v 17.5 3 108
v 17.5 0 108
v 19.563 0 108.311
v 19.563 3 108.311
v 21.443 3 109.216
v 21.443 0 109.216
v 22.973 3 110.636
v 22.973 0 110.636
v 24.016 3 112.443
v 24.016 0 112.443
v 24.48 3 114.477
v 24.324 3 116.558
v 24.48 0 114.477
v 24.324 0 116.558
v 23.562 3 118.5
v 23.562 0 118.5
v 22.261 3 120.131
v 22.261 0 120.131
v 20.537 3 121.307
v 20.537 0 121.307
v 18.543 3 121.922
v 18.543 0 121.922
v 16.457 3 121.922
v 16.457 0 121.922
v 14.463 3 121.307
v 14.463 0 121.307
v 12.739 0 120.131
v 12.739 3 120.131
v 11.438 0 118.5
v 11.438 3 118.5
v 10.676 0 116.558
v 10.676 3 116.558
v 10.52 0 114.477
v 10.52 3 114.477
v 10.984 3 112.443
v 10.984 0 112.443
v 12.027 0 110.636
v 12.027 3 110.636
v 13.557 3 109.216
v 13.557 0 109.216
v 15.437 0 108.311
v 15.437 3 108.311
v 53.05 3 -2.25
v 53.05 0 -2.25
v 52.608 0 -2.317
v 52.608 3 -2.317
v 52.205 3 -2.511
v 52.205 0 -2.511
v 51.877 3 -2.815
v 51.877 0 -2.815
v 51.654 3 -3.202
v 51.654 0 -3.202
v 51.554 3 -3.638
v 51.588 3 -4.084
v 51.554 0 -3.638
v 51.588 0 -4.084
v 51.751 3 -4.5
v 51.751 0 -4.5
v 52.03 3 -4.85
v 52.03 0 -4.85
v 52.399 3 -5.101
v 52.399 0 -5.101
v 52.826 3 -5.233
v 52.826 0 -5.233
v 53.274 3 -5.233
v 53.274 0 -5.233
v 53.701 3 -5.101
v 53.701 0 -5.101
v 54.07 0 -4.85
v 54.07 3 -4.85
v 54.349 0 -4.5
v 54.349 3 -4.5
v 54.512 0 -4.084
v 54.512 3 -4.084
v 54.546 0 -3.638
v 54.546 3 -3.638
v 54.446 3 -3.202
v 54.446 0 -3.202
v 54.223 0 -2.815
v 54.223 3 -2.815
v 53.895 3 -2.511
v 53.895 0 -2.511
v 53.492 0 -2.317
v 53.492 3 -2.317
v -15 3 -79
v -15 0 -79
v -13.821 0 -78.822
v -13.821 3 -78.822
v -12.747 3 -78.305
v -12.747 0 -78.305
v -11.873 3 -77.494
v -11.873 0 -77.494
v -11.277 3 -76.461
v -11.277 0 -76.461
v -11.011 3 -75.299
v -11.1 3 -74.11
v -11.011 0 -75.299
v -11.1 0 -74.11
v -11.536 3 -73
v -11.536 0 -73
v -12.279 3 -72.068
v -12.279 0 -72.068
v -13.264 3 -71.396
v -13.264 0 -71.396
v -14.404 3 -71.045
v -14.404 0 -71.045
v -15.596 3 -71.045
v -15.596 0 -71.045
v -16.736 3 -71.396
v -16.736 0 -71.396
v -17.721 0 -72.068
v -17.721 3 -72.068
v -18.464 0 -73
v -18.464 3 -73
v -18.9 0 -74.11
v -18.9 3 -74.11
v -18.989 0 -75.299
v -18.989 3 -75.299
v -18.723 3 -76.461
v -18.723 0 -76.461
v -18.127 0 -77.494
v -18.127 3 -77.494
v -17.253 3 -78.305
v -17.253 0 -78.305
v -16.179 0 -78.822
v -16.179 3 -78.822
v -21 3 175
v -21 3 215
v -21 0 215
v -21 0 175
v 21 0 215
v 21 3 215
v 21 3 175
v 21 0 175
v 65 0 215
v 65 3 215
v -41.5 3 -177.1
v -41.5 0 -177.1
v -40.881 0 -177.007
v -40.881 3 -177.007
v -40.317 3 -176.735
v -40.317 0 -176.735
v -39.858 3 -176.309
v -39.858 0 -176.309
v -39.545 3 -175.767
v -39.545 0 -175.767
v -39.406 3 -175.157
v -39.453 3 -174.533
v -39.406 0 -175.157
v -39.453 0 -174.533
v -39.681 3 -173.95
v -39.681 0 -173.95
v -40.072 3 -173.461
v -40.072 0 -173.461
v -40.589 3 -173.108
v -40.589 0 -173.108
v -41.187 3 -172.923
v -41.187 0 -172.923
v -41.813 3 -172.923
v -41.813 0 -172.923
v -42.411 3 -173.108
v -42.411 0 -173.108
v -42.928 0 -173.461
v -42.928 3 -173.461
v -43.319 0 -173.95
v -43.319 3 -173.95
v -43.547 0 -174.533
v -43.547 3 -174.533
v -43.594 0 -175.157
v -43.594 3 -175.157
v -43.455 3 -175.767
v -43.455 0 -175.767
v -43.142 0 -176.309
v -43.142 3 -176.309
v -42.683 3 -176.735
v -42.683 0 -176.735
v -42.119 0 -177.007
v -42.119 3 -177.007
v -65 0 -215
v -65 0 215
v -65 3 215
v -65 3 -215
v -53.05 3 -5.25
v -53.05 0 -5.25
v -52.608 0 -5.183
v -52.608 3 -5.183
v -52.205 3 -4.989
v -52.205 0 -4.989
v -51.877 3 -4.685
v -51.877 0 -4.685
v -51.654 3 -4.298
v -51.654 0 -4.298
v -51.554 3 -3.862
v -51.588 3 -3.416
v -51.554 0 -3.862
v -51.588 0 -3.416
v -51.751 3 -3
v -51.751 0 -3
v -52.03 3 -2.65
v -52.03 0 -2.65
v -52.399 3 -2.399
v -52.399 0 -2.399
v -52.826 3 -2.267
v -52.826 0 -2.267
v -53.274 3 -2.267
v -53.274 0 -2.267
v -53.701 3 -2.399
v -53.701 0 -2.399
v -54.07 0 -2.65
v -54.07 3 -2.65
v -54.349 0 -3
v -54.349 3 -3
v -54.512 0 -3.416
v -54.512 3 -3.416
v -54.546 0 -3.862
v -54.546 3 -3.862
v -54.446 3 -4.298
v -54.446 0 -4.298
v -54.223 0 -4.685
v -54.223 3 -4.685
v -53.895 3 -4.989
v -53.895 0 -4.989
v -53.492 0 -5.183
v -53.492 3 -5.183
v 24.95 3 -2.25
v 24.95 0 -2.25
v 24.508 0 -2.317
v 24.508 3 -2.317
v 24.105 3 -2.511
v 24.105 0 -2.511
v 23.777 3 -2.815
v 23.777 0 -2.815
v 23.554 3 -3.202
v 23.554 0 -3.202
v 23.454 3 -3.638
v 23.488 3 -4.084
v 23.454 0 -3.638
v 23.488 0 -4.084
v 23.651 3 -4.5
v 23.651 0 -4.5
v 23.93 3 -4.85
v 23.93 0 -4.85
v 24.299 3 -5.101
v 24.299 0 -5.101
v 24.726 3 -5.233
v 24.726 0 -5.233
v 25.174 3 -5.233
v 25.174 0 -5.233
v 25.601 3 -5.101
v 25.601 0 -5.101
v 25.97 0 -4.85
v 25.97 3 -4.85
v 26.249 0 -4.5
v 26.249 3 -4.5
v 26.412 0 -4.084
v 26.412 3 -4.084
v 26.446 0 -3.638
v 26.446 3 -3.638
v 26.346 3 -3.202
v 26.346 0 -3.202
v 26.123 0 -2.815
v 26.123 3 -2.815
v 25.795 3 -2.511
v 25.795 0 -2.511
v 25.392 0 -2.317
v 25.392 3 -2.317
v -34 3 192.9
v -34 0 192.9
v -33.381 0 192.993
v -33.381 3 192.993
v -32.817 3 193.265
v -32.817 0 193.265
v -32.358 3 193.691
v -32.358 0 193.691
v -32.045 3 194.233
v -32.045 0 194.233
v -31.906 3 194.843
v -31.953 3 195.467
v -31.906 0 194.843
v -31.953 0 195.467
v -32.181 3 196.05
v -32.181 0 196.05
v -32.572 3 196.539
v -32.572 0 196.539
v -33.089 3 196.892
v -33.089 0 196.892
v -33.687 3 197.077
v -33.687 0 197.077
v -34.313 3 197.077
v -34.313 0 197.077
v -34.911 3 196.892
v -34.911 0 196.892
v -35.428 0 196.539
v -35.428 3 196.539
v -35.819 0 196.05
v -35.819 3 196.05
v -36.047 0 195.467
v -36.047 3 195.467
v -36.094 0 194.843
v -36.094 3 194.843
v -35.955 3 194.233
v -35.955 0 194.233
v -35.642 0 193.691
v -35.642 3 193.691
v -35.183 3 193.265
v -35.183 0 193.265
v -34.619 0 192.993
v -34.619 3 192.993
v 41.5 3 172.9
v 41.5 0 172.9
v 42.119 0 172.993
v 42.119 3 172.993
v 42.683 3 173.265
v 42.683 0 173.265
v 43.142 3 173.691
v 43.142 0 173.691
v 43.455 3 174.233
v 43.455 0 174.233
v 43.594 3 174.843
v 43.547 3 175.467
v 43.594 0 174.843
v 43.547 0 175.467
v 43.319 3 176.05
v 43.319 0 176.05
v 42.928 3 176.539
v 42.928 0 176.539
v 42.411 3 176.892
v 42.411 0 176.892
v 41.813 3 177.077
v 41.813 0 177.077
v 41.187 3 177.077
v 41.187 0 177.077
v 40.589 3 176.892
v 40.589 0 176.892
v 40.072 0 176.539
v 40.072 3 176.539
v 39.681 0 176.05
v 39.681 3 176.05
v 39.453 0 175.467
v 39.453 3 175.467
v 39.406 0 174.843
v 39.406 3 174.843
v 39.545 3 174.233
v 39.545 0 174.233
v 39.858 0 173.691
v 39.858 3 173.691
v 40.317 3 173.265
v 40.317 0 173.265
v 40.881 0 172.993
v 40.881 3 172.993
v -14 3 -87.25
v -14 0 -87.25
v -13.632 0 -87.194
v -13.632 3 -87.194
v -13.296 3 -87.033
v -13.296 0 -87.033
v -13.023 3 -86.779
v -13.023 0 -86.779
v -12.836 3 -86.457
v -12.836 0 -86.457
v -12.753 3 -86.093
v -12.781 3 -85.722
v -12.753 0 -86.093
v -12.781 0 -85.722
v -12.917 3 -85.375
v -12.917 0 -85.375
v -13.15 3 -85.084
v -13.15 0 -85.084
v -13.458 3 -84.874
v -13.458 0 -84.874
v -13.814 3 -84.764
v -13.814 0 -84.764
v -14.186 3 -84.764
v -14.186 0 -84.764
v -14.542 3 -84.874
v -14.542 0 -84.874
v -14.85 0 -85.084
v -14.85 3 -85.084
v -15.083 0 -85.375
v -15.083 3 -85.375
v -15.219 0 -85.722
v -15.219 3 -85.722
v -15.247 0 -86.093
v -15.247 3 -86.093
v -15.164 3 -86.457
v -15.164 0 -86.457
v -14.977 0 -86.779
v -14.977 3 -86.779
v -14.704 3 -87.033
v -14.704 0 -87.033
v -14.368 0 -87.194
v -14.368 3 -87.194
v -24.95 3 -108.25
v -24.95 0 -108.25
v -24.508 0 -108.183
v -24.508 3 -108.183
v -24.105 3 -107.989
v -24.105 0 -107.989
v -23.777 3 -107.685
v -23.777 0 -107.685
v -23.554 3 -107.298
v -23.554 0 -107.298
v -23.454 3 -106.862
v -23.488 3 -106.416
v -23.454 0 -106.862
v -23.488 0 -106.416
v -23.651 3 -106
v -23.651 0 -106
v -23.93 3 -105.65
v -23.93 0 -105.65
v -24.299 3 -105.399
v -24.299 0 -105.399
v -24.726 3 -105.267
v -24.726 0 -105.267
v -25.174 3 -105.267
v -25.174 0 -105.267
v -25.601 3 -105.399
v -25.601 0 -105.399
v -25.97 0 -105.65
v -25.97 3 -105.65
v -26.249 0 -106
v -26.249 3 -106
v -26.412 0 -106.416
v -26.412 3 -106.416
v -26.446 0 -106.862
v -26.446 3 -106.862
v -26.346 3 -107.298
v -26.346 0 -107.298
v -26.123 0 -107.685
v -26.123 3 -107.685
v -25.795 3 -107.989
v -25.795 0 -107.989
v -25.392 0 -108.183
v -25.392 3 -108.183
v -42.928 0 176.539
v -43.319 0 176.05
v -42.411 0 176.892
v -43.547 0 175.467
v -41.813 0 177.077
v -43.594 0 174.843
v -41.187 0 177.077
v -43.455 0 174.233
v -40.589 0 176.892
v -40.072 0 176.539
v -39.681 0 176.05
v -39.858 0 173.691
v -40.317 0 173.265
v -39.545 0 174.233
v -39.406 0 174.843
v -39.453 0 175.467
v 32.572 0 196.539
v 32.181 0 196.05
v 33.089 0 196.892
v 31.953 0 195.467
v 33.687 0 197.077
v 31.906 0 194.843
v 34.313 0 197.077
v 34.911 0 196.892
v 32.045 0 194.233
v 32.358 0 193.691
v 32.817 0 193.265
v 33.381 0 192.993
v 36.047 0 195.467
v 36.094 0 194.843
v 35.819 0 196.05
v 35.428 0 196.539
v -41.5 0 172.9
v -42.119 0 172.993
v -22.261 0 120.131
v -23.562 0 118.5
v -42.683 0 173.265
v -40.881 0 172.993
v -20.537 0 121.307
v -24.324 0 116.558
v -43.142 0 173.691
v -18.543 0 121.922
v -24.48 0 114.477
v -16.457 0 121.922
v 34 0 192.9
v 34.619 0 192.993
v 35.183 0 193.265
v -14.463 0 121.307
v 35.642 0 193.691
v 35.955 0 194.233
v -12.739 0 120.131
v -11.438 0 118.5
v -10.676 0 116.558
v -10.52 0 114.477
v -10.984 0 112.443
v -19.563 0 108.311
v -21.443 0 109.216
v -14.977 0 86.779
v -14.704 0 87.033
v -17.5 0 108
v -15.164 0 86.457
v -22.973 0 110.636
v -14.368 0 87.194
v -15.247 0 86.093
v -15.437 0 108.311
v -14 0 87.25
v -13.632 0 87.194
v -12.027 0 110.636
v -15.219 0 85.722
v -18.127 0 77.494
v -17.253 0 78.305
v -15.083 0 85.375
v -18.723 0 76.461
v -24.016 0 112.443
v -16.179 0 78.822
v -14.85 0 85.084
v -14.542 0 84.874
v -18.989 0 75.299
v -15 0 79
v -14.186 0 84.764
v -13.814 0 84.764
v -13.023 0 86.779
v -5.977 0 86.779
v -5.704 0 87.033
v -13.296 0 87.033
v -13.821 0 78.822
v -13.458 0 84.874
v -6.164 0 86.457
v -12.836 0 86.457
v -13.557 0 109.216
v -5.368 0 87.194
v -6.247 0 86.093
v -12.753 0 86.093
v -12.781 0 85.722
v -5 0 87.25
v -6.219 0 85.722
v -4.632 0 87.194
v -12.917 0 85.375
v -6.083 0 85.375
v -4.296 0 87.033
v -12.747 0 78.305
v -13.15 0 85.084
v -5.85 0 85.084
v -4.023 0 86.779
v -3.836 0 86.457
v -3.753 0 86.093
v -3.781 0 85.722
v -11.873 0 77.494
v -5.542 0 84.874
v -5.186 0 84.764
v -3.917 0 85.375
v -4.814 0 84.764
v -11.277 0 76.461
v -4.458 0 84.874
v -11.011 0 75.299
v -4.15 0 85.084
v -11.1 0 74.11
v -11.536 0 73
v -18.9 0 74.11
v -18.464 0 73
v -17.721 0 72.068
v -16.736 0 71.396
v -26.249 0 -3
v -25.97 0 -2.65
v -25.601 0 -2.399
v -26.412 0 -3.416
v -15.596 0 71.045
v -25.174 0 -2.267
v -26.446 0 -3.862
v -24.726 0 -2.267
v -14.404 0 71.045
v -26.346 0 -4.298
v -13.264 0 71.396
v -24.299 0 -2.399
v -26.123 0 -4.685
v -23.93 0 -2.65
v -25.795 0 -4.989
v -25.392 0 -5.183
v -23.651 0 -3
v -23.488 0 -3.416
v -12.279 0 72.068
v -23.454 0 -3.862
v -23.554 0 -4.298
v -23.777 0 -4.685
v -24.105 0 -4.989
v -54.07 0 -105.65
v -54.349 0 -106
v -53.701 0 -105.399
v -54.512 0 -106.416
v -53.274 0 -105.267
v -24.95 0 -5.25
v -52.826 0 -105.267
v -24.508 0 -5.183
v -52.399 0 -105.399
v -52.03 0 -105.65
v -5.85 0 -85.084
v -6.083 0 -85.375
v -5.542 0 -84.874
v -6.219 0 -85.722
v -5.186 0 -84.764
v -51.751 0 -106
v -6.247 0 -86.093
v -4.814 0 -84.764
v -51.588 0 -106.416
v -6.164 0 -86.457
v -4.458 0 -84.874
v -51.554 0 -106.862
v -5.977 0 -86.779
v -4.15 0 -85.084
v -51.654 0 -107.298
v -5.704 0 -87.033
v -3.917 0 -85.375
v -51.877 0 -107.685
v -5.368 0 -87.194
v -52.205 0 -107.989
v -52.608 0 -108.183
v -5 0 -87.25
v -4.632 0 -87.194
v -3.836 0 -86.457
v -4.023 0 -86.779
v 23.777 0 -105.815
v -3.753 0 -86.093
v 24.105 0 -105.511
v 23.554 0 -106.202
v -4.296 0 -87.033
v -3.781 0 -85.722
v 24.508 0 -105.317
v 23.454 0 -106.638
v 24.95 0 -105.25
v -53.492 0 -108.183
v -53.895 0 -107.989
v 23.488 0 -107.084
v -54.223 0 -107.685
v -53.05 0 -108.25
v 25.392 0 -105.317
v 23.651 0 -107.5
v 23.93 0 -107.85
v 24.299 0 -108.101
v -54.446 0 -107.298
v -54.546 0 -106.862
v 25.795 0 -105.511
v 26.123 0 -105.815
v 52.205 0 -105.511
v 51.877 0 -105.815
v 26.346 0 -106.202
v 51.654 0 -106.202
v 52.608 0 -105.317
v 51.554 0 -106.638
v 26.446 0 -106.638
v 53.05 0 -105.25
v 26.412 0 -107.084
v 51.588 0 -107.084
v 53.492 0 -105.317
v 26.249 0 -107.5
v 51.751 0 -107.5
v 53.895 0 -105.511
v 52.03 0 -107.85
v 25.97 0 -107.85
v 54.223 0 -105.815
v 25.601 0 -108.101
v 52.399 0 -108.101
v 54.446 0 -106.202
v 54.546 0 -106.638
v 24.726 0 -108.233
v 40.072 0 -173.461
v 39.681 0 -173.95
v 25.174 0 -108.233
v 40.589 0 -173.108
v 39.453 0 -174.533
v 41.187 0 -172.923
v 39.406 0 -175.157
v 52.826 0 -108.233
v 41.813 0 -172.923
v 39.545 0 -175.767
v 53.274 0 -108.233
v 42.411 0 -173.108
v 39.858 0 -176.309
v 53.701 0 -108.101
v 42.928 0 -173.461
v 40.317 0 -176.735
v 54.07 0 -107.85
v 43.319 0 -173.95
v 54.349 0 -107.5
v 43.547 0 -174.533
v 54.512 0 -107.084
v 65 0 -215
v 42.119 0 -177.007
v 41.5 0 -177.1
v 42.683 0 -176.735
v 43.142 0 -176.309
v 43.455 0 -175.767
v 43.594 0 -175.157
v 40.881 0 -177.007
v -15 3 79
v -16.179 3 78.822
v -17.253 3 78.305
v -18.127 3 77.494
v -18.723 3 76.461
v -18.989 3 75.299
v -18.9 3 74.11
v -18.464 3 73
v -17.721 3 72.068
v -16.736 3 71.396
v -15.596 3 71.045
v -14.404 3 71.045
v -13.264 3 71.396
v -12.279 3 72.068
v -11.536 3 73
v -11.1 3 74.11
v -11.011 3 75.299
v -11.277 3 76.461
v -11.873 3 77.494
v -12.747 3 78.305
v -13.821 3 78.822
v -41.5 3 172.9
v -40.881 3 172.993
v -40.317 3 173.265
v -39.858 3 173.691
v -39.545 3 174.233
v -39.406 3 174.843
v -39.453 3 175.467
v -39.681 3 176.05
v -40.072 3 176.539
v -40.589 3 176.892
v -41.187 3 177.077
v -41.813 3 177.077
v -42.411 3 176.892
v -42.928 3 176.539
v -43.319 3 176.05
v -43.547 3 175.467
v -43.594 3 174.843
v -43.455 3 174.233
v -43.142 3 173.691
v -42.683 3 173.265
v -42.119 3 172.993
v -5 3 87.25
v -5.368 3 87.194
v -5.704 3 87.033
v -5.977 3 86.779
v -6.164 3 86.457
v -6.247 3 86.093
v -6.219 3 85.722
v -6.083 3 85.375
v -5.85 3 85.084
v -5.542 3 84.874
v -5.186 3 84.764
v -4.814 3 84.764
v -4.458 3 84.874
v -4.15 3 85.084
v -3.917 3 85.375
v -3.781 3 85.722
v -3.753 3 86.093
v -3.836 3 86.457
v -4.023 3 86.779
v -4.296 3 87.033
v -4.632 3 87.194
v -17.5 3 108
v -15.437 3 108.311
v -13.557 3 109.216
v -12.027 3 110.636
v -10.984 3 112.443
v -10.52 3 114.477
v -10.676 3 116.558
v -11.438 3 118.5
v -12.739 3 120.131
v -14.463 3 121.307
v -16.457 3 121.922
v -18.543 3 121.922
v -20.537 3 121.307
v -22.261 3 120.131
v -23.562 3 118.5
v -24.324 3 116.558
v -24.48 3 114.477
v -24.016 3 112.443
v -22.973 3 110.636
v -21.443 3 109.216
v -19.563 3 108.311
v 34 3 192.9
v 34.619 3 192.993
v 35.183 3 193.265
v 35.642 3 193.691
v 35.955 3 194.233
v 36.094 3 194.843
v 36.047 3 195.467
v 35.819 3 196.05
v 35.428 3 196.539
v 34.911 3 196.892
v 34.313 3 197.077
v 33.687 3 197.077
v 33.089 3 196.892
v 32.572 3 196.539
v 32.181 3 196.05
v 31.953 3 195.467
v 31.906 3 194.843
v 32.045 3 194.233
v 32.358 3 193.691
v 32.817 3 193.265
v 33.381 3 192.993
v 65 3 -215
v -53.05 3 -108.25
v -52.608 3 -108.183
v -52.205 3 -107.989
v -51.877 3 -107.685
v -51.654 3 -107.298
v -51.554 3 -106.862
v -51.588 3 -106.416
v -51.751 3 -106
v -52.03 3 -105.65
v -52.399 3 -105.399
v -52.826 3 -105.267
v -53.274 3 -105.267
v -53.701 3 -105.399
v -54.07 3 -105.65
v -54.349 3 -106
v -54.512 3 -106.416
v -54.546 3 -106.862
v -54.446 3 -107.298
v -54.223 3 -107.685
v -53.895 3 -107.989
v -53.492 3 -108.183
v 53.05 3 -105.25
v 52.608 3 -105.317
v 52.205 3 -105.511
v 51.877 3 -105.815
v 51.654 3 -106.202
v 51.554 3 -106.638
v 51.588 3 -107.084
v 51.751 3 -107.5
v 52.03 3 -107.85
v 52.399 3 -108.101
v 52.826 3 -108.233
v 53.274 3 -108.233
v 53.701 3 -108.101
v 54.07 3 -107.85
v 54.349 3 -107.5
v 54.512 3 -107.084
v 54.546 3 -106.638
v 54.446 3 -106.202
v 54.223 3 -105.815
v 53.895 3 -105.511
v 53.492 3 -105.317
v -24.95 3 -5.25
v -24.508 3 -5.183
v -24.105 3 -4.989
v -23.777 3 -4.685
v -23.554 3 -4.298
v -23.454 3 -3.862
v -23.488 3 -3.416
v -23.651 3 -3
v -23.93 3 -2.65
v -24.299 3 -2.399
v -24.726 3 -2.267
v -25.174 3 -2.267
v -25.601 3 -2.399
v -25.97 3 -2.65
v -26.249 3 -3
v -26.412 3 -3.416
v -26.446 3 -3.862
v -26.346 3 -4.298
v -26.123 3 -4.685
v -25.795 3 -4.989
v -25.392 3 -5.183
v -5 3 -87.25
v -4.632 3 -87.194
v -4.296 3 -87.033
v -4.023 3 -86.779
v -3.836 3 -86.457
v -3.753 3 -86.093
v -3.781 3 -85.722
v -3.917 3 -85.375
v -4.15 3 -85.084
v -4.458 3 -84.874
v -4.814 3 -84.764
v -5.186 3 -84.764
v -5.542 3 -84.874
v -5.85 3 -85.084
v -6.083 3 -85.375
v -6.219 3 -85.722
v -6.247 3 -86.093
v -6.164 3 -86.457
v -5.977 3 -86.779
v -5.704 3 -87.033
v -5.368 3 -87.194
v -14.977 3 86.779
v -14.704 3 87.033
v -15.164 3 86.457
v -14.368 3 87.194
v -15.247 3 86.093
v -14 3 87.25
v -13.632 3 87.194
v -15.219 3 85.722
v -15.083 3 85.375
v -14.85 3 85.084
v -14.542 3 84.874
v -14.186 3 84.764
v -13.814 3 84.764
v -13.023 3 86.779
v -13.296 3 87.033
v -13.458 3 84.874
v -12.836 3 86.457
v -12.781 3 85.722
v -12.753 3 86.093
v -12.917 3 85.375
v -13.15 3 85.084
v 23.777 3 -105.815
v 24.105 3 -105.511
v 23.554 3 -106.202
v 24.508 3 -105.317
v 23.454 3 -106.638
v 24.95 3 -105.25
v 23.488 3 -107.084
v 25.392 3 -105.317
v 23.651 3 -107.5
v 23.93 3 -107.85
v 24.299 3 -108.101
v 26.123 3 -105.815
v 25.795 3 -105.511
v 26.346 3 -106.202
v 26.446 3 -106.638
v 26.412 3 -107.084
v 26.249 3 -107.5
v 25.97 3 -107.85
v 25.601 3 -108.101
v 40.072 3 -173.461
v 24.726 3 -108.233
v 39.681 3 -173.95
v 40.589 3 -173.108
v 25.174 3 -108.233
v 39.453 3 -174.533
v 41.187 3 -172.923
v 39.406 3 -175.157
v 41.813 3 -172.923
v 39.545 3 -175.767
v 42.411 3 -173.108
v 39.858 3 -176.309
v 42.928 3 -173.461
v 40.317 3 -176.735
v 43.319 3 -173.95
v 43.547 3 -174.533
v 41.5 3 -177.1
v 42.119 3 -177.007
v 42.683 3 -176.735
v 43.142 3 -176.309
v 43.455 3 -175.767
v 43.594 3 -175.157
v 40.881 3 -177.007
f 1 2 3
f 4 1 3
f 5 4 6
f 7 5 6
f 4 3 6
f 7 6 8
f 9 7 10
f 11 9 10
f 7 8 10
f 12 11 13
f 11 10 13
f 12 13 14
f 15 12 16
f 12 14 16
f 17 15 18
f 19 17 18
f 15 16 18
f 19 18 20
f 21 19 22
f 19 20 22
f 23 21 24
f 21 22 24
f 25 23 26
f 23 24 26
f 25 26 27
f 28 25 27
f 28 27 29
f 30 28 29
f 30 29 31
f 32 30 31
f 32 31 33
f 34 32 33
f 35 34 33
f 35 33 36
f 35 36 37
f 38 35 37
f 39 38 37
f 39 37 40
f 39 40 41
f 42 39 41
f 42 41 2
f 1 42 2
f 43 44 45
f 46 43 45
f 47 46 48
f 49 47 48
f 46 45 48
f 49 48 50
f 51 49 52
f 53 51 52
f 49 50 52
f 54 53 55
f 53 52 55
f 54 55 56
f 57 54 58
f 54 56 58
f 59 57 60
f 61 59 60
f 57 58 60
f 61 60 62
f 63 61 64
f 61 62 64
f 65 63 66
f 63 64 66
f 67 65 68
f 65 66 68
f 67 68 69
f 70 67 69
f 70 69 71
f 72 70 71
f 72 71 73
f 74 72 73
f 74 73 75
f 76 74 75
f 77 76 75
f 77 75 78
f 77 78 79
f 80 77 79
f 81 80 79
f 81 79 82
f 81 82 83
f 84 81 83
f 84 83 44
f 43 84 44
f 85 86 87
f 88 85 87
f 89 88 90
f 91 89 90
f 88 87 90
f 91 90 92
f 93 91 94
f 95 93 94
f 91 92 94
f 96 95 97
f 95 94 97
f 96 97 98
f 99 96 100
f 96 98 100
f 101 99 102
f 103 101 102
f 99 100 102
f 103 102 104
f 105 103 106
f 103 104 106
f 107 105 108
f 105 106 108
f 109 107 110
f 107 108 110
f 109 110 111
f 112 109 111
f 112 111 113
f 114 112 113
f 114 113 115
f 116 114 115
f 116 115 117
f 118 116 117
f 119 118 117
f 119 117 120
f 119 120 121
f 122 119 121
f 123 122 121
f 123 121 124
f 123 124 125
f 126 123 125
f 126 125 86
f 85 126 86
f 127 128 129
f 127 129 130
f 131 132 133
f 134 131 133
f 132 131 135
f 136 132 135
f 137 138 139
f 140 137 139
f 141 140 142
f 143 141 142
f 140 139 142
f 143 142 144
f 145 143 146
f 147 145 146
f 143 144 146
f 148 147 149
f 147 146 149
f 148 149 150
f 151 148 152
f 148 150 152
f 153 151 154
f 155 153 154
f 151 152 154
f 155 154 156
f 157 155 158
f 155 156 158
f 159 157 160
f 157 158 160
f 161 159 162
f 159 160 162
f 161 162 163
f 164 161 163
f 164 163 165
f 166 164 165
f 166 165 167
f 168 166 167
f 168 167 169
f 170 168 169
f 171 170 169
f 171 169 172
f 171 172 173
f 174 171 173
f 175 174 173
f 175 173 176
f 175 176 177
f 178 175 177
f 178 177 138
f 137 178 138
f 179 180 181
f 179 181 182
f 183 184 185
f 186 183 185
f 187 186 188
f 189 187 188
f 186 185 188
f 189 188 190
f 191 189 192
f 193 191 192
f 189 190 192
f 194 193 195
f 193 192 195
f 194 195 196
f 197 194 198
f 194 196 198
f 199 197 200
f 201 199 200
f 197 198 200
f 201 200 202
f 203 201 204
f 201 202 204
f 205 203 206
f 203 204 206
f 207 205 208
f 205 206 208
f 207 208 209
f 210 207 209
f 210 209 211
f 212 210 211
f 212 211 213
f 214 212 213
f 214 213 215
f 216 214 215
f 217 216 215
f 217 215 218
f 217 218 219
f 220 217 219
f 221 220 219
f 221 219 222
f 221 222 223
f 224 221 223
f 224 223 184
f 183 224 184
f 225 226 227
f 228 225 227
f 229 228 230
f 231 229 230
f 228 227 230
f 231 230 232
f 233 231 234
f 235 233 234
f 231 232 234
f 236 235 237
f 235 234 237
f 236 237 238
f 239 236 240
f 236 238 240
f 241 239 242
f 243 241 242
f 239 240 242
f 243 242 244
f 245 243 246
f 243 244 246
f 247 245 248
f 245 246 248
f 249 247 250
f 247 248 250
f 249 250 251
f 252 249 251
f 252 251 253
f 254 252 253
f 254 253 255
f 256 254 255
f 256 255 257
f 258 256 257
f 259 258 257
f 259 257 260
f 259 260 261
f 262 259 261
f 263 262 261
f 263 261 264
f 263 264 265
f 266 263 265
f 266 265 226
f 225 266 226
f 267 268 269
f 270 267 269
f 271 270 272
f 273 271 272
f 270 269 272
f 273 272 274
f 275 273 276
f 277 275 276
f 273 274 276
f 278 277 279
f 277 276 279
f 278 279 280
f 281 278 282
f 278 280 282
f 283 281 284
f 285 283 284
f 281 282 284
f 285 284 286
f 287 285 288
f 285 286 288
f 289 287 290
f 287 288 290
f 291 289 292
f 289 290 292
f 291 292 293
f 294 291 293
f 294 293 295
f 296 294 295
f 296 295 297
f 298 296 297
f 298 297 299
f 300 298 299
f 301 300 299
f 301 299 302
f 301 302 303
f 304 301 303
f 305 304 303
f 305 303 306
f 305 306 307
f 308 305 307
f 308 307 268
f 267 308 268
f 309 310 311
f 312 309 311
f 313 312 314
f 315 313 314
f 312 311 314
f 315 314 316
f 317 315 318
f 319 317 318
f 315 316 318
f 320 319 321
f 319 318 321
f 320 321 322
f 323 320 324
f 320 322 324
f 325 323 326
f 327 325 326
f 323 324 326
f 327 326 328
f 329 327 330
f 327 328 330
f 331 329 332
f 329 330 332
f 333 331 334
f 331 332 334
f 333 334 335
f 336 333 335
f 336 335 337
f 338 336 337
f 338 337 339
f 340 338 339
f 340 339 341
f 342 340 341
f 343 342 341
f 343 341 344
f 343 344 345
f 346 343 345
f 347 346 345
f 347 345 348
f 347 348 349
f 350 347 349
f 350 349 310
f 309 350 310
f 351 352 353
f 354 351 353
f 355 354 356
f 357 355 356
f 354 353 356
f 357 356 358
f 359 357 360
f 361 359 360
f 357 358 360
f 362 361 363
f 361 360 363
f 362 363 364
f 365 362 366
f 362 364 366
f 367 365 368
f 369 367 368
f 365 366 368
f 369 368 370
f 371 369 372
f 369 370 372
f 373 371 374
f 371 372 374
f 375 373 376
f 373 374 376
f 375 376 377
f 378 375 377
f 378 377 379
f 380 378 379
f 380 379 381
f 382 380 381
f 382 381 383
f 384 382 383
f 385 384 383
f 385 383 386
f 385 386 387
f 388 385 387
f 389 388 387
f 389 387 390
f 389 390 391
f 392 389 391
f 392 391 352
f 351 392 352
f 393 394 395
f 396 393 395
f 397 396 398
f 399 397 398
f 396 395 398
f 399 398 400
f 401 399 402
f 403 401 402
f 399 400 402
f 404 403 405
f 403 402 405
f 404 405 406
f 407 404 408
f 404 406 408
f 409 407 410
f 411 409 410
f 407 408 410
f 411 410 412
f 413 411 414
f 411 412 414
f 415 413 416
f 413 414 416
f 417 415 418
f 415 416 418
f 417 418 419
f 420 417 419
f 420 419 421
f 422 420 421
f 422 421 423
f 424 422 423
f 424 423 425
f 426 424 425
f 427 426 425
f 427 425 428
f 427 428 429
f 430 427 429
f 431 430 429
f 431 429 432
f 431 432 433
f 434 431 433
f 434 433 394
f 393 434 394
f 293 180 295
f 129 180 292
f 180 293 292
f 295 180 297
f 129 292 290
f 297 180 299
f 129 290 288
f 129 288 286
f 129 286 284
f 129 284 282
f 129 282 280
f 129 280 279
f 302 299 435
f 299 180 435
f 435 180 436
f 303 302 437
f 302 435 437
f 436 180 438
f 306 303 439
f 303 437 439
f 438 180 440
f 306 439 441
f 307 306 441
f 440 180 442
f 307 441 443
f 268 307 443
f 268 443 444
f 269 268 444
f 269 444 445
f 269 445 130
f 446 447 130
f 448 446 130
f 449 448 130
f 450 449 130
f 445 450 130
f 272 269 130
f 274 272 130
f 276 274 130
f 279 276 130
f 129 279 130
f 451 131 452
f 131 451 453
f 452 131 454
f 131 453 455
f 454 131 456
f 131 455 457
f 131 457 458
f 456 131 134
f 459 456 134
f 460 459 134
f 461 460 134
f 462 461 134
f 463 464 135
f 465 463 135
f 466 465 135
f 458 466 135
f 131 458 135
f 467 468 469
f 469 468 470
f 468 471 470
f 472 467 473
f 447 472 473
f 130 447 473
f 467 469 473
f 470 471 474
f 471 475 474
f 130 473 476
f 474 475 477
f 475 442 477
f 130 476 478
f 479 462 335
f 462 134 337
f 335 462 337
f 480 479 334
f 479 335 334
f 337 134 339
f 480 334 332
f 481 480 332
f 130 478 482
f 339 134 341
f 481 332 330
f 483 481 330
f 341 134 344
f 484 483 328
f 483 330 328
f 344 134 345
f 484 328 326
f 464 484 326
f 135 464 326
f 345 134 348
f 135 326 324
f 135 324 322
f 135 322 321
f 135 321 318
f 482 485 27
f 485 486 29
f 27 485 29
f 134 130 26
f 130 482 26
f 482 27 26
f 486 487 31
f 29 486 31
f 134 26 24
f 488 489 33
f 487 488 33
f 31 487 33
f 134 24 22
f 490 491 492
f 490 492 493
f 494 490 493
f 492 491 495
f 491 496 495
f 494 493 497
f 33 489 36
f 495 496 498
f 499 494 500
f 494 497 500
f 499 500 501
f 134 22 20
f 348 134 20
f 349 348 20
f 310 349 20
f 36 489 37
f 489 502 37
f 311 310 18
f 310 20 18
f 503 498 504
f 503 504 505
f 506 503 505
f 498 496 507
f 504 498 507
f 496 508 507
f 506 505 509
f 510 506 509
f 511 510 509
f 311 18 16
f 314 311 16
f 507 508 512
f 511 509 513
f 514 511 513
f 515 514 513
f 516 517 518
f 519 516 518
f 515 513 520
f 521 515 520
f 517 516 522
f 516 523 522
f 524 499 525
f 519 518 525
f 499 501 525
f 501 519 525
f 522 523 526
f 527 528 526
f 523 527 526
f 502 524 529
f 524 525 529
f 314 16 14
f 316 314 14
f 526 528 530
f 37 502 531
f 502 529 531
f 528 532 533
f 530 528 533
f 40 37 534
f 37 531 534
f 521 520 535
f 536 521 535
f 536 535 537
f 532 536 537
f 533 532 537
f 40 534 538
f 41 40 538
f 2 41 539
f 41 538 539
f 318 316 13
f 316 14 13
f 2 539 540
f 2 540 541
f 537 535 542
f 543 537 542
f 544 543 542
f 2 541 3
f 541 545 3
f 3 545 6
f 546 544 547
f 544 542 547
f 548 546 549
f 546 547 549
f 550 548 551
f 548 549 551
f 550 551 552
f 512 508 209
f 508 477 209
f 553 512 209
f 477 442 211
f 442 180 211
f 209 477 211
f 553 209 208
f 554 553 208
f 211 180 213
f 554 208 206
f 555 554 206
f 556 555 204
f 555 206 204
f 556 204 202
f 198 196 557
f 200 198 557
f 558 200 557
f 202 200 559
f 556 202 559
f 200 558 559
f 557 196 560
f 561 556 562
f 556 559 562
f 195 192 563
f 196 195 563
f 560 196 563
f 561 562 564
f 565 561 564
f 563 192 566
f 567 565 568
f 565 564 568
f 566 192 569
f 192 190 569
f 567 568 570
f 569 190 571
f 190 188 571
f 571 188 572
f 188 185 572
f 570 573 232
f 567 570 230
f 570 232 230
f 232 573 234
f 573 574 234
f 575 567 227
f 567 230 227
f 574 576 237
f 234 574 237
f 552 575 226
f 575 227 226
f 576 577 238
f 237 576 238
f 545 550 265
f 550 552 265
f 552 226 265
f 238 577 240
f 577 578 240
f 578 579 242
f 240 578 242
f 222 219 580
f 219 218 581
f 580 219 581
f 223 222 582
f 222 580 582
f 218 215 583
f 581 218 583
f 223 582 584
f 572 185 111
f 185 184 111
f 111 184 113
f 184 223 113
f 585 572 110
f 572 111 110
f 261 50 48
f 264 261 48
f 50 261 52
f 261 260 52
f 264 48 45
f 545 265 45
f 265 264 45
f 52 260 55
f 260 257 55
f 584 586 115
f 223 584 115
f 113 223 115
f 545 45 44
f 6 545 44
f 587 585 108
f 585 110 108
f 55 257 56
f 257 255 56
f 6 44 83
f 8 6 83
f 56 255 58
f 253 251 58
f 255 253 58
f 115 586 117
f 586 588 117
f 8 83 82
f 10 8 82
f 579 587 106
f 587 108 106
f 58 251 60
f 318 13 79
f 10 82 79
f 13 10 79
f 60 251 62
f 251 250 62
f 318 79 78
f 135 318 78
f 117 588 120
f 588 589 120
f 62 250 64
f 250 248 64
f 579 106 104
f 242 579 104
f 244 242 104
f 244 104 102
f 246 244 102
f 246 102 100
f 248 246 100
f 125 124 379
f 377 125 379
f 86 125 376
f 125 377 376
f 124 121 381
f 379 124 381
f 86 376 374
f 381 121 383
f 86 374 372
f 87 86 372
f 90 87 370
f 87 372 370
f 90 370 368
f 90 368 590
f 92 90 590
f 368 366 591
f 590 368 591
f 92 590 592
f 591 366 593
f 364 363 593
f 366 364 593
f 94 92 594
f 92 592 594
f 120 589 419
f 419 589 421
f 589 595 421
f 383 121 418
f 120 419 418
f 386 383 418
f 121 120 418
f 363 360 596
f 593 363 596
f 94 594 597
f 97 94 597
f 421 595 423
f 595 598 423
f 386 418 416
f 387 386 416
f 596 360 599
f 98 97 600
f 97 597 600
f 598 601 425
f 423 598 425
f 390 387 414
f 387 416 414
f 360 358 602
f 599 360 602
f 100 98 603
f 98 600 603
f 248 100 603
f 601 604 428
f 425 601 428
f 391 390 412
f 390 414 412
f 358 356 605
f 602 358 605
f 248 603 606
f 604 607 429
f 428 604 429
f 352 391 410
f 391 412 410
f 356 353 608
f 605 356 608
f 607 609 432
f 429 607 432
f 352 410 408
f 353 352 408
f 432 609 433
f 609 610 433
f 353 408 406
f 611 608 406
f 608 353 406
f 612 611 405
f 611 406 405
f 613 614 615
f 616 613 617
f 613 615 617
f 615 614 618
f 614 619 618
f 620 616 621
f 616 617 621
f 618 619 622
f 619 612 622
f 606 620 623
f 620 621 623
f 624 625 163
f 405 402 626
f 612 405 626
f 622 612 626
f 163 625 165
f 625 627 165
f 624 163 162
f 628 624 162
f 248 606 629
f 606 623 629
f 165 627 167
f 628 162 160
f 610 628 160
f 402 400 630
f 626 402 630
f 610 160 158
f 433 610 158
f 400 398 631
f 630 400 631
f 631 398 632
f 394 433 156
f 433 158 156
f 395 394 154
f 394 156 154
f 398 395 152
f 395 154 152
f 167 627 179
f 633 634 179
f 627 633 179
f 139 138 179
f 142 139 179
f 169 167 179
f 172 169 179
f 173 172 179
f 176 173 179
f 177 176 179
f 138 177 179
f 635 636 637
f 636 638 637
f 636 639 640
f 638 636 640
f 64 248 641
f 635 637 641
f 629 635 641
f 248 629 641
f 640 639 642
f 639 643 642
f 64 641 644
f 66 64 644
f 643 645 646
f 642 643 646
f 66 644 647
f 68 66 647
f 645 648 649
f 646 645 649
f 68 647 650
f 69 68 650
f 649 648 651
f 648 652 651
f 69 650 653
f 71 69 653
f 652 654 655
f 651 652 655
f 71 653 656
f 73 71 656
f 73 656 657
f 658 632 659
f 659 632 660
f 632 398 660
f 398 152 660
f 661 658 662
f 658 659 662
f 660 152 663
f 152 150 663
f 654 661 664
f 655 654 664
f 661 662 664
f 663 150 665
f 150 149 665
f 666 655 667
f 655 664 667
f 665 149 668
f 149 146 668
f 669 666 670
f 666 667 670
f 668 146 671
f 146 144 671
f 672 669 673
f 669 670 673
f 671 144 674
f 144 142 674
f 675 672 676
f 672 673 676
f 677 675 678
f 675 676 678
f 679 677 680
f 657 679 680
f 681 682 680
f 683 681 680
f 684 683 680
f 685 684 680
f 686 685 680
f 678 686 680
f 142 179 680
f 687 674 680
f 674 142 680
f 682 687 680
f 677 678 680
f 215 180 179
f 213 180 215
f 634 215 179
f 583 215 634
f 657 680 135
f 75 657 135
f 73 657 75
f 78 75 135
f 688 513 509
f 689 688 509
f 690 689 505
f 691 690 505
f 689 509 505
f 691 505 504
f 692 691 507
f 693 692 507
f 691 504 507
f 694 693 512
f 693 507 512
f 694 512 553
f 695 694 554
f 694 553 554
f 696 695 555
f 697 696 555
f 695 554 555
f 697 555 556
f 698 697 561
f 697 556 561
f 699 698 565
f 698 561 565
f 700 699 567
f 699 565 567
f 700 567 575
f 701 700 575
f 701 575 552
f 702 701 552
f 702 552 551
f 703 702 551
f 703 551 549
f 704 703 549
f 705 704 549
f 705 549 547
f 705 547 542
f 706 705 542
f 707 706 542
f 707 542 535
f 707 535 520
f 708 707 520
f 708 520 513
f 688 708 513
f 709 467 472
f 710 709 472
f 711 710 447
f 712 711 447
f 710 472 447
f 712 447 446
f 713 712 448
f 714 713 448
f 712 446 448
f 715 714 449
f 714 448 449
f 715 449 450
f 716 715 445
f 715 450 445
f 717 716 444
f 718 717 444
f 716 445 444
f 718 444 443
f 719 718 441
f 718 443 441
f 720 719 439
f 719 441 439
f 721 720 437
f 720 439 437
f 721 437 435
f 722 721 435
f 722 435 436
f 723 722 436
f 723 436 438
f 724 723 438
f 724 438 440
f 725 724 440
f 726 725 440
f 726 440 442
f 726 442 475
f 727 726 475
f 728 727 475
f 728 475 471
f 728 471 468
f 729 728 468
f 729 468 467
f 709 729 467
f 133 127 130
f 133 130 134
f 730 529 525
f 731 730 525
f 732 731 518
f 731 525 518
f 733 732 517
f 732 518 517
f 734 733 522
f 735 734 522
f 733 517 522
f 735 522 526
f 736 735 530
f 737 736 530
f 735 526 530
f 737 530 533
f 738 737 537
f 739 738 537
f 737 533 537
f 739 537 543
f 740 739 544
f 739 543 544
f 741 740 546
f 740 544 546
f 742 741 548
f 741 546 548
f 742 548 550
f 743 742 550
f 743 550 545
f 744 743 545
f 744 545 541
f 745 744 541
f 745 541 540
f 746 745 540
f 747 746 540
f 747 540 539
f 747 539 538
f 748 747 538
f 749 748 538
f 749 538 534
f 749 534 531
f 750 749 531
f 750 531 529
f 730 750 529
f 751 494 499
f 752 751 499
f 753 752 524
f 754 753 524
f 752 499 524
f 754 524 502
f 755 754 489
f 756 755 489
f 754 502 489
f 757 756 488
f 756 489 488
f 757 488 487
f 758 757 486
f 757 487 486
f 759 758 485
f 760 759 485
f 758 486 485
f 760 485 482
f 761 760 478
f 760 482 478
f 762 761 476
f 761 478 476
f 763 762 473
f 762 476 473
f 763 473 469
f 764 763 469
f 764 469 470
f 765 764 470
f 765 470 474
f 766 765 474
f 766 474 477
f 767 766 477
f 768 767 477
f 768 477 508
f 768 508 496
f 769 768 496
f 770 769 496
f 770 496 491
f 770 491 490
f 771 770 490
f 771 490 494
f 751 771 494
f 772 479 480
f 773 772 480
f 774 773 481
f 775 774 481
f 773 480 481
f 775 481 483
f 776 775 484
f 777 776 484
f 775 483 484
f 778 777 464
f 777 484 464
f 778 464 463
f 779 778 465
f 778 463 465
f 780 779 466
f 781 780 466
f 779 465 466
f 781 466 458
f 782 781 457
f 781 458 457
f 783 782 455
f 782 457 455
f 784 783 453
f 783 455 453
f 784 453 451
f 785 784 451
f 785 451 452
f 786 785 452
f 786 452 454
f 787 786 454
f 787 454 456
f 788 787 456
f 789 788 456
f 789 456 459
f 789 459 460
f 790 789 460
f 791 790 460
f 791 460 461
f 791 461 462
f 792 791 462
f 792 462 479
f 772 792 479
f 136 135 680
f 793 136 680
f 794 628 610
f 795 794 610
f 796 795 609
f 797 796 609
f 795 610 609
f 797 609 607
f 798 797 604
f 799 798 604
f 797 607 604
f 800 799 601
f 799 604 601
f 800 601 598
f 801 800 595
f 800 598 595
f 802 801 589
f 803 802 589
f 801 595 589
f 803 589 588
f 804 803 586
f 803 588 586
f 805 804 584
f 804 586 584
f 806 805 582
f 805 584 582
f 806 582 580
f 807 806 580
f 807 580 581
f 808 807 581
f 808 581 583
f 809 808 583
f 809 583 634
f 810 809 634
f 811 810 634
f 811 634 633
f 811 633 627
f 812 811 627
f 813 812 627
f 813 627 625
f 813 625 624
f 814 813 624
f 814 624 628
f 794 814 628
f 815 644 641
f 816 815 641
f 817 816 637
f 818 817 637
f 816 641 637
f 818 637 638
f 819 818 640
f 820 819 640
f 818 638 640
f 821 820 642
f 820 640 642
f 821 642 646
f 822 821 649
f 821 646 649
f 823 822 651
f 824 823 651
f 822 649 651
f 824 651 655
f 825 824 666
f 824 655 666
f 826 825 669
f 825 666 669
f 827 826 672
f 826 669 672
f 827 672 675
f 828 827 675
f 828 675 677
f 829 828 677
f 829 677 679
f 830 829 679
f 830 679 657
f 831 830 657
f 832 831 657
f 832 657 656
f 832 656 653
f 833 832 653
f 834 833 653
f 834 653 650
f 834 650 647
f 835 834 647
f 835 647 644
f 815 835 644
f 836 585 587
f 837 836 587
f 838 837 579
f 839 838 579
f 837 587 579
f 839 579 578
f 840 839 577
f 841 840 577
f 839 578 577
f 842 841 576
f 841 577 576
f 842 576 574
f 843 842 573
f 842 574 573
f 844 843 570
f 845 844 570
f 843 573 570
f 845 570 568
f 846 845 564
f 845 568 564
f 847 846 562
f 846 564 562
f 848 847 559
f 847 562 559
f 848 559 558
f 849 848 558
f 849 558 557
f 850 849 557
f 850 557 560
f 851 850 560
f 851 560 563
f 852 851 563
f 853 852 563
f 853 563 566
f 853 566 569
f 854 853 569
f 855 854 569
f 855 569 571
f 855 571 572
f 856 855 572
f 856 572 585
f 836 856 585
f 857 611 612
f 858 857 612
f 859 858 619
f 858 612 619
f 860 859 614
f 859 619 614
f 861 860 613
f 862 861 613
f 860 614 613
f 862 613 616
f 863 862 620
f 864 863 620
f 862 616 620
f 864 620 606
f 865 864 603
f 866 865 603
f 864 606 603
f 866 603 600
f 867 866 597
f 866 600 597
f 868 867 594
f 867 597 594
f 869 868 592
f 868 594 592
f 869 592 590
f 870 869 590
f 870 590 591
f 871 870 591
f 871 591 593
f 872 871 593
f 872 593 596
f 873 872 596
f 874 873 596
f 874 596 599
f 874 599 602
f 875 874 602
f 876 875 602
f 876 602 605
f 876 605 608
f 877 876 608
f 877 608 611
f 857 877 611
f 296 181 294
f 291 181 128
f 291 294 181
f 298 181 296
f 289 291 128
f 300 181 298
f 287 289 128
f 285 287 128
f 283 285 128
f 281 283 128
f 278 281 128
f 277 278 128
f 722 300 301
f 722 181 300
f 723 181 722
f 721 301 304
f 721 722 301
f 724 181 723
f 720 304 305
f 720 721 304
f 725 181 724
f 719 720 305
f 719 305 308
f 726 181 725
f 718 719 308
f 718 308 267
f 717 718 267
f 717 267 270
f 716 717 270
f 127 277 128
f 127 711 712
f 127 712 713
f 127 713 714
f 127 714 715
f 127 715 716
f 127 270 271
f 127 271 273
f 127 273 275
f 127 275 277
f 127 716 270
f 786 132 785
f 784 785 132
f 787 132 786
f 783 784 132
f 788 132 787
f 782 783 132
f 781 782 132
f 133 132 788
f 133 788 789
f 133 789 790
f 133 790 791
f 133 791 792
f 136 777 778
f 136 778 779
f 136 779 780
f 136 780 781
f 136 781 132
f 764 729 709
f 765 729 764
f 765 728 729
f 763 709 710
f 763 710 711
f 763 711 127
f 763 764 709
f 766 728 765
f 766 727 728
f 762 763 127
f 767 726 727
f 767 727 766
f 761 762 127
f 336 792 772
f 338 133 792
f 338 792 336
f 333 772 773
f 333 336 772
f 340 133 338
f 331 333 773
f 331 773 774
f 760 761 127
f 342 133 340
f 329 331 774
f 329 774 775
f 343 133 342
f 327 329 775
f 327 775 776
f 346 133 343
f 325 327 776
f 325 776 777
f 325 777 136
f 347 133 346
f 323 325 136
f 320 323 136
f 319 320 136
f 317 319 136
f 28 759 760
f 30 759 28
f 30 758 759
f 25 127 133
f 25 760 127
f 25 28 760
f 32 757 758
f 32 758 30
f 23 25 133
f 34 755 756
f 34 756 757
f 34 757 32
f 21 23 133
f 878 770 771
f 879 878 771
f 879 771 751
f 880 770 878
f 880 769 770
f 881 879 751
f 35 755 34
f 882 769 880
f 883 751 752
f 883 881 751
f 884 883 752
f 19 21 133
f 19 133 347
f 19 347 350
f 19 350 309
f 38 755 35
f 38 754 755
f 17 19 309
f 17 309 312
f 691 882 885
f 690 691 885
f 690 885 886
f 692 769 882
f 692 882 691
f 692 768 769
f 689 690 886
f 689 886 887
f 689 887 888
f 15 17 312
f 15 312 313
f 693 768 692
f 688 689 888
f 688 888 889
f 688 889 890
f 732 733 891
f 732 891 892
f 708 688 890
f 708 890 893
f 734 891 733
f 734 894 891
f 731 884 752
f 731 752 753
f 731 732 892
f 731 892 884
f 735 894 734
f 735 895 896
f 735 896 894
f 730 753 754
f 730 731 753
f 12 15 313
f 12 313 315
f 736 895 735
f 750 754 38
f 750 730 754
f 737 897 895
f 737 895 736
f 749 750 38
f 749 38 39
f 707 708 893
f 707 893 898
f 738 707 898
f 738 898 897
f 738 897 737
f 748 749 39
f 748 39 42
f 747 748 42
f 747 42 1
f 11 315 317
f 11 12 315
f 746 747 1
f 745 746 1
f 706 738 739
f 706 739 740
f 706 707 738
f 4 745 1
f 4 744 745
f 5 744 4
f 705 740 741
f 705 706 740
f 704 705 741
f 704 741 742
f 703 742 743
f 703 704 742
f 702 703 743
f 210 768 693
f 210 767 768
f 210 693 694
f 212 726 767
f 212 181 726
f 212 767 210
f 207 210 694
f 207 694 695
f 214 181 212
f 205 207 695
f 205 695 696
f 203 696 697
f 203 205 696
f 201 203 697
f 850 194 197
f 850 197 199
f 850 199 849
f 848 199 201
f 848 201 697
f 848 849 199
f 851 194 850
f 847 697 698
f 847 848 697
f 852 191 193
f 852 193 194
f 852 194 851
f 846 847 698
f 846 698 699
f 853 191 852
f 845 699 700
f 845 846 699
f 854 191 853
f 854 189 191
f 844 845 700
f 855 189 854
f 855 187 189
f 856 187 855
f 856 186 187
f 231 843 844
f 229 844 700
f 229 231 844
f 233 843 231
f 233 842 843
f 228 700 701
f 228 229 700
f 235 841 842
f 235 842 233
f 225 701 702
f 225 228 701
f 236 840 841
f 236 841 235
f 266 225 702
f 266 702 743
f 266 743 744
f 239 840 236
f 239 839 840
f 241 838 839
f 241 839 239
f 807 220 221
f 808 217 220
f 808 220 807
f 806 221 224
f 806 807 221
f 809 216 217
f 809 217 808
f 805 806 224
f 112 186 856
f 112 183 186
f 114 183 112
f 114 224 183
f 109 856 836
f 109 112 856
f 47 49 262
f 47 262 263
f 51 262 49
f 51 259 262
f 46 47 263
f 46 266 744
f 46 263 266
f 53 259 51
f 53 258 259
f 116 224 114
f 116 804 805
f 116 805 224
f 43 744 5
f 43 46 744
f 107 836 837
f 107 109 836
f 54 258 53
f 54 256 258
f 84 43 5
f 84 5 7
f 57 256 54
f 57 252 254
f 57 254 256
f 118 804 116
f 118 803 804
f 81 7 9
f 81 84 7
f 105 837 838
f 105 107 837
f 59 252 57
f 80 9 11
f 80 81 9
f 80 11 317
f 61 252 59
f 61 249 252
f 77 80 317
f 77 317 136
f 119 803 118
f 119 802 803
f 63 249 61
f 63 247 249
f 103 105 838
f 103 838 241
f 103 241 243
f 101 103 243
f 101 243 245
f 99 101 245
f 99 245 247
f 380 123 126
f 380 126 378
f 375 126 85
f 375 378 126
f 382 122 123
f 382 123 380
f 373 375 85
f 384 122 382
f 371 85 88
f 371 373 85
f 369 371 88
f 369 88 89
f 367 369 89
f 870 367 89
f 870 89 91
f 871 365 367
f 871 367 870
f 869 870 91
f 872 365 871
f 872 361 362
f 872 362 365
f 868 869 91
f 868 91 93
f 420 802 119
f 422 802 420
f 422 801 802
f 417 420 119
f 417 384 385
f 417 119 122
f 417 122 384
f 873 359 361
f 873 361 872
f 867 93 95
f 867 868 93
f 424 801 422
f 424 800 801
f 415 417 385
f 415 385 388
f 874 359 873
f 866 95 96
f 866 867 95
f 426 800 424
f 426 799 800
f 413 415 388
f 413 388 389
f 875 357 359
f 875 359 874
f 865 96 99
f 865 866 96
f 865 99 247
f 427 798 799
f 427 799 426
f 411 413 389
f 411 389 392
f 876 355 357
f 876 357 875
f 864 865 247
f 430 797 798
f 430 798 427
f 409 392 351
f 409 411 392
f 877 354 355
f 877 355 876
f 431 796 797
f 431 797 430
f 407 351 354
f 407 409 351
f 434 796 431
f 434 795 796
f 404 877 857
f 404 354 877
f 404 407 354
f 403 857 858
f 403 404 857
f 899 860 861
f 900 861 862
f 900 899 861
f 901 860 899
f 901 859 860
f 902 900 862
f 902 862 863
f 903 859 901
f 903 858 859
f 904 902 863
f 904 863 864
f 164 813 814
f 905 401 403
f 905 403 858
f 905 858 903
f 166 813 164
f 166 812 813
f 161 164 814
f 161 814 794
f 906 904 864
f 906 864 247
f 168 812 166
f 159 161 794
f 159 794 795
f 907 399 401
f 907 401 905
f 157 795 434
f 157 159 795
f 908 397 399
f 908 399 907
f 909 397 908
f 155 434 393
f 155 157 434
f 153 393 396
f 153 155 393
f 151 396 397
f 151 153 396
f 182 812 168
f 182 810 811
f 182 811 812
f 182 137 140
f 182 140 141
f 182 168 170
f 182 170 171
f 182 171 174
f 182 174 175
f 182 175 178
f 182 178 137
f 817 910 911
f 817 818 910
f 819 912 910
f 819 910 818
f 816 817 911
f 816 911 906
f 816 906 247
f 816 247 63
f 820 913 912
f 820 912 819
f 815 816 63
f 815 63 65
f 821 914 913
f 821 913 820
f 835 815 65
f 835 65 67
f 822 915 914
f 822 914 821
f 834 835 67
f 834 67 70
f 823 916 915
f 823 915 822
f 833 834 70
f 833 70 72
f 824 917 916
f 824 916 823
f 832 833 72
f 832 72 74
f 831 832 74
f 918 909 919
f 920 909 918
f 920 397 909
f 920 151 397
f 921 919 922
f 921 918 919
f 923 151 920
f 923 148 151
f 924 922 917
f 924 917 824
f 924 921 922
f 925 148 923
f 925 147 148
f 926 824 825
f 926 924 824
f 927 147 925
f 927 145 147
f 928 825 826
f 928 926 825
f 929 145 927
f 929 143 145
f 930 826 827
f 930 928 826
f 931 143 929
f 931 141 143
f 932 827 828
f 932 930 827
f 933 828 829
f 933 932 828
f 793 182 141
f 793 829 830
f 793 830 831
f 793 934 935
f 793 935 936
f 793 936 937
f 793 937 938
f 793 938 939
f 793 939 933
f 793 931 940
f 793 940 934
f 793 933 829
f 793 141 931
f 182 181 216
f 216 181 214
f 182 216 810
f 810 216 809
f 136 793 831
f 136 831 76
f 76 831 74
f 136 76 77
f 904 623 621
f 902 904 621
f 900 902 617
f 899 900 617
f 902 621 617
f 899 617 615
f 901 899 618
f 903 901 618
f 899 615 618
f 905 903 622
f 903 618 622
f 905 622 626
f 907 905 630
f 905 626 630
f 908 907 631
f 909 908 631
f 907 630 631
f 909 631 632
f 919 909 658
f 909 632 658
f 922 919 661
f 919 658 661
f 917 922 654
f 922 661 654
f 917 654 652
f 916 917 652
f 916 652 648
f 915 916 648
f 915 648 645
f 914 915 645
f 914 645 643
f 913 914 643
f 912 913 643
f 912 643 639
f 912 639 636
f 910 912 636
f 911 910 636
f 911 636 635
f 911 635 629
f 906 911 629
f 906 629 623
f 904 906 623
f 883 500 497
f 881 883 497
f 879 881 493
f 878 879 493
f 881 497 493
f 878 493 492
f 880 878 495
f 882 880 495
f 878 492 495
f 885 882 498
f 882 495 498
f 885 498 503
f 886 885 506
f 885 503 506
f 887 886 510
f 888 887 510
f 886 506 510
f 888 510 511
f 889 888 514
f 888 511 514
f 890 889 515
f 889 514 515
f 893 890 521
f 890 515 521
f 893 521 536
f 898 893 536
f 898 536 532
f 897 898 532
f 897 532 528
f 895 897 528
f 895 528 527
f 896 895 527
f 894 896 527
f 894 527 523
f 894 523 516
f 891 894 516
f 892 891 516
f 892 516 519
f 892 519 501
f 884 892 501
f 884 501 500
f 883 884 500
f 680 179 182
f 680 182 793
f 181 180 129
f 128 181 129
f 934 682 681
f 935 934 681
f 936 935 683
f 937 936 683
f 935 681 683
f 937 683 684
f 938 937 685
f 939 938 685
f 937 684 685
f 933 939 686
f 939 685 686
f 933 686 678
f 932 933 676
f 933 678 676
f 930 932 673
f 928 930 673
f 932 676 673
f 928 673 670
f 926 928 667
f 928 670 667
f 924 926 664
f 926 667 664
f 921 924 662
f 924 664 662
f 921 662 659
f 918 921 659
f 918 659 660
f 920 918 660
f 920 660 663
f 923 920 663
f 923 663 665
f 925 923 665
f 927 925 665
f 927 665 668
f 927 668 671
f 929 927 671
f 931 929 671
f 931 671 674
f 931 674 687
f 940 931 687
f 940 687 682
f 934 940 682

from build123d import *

# Parameters (mm, degrees)
SKETCH1_W           = 130
SKETCH1_H           = 430
BOSS_EXTRUDE1_DEPTH = 3
SKETCH2_W           = 42
SKETCH2_H           = 40
CUT_EXTRUDE1_DEPTH  = 10
SKETCH3_R           = 1.5
SKETCH3_R_2         = 2.1
CUT_EXTRUDE2_DEPTH  = 10
SKETCH4_R           = 7
CUT_EXTRUDE3_DEPTH  = 10
SKETCH5_R           = 4
SKETCH5_R_2         = 1.25
CUT_EXTRUDE4_DEPTH  = 10


with BuildPart() as part:
    # Sketch1 → Boss-Extrude1 (new body)
    with BuildSketch(Plane(origin=(0, 0, 0), x_dir=(1, 0, 0), z_dir=(0, 1, 0))):
        Rectangle(SKETCH1_W, SKETCH1_H)
    extrude(amount=BOSS_EXTRUDE1_DEPTH)

    # Sketch2 → Cut-Extrude1 (cut)
    with BuildSketch(Plane(origin=(0, 3, 0), x_dir=(1, 0, 0), z_dir=(0, 1, 0))):
        with Locations((0, -195)):
            Rectangle(SKETCH2_W, SKETCH2_H)
    extrude(amount=-CUT_EXTRUDE1_DEPTH, mode=Mode.SUBTRACT)

    # Sketch3 → Cut-Extrude2 (cut)
    with BuildSketch(Plane.XZ):
        with Locations(Location((-53.05, -3.75, 0), (0, 0, 270))):
            Circle(SKETCH3_R)
        with Locations(Location((-24.95, -3.75, 0), (0, 0, 270))):
            Circle(SKETCH3_R)
        with Locations(Location((-53.05, -106.75, 0), (0, 0, 270))):
            Circle(SKETCH3_R)
        with Locations(Location((-24.95, -106.75, 0), (0, 0, 270))):
            Circle(SKETCH3_R)
        with Locations(Location((24.95, -106.75, 0), (0, 0, 90))):
            Circle(SKETCH3_R)
        with Locations(Location((34, 195, 0), (0, 0, 270))):
            Circle(SKETCH3_R_2)
        with Locations(Location((53.05, -106.75, 0), (0, 0, 90))):
            Circle(SKETCH3_R)
        with Locations(Location((24.95, -3.75, 0), (0, 0, 90))):
            Circle(SKETCH3_R)
        with Locations(Location((-34, 195, 0), (0, 0, 270))):
            Circle(SKETCH3_R_2)
        with Locations(Location((53.05, -3.75, 0), (0, 0, 90))):
            Circle(SKETCH3_R)
        with Locations(Location((-41.5, 175, 0), (0, 0, 270))):
            Circle(SKETCH3_R_2)
        with Locations(Location((41.5, 175, 0), (0, 0, 270))):
            Circle(SKETCH3_R_2)
        with Locations(Location((41.5, -175, 0), (0, 0, 270))):
            Circle(SKETCH3_R_2)
        with Locations(Location((-41.5, -175, 0), (0, 0, 270))):
            Circle(SKETCH3_R_2)
    extrude(amount=-CUT_EXTRUDE2_DEPTH, mode=Mode.SUBTRACT)

    # Sketch4 → Cut-Extrude3 (cut)
    with BuildSketch(Plane.XZ):
        with Locations(Location((-17.5, 115, 0), (0, 0, 270))):
            Circle(SKETCH4_R)
        with Locations(Location((17.5, 115, 0), (0, 0, 270))):
            Circle(SKETCH4_R)
    extrude(amount=-CUT_EXTRUDE3_DEPTH, mode=Mode.SUBTRACT)

    # Sketch5 → Cut-Extrude4 (cut)
    with BuildSketch(Plane.XZ):
        with Locations(Location((-15, -75, 0), (0, 0, 270))):
            Circle(SKETCH5_R)
        with Locations(Location((-14, -86, 0), (0, 0, 270))):
            Circle(SKETCH5_R_2)
        with Locations(Location((-5, -86, 0), (0, 0, 270))):
            Circle(SKETCH5_R_2)
        with Locations(Location((-15, 75, 0), (0, 0, 90))):
            Circle(SKETCH5_R)
        with Locations(Location((-14, 86, 0), (0, 0, 90))):
            Circle(SKETCH5_R_2)
        with Locations(Location((-5, 86, 0), (0, 0, 90))):
            Circle(SKETCH5_R_2)
    extrude(amount=-CUT_EXTRUDE4_DEPTH, mode=Mode.SUBTRACT)


solid = part.part
